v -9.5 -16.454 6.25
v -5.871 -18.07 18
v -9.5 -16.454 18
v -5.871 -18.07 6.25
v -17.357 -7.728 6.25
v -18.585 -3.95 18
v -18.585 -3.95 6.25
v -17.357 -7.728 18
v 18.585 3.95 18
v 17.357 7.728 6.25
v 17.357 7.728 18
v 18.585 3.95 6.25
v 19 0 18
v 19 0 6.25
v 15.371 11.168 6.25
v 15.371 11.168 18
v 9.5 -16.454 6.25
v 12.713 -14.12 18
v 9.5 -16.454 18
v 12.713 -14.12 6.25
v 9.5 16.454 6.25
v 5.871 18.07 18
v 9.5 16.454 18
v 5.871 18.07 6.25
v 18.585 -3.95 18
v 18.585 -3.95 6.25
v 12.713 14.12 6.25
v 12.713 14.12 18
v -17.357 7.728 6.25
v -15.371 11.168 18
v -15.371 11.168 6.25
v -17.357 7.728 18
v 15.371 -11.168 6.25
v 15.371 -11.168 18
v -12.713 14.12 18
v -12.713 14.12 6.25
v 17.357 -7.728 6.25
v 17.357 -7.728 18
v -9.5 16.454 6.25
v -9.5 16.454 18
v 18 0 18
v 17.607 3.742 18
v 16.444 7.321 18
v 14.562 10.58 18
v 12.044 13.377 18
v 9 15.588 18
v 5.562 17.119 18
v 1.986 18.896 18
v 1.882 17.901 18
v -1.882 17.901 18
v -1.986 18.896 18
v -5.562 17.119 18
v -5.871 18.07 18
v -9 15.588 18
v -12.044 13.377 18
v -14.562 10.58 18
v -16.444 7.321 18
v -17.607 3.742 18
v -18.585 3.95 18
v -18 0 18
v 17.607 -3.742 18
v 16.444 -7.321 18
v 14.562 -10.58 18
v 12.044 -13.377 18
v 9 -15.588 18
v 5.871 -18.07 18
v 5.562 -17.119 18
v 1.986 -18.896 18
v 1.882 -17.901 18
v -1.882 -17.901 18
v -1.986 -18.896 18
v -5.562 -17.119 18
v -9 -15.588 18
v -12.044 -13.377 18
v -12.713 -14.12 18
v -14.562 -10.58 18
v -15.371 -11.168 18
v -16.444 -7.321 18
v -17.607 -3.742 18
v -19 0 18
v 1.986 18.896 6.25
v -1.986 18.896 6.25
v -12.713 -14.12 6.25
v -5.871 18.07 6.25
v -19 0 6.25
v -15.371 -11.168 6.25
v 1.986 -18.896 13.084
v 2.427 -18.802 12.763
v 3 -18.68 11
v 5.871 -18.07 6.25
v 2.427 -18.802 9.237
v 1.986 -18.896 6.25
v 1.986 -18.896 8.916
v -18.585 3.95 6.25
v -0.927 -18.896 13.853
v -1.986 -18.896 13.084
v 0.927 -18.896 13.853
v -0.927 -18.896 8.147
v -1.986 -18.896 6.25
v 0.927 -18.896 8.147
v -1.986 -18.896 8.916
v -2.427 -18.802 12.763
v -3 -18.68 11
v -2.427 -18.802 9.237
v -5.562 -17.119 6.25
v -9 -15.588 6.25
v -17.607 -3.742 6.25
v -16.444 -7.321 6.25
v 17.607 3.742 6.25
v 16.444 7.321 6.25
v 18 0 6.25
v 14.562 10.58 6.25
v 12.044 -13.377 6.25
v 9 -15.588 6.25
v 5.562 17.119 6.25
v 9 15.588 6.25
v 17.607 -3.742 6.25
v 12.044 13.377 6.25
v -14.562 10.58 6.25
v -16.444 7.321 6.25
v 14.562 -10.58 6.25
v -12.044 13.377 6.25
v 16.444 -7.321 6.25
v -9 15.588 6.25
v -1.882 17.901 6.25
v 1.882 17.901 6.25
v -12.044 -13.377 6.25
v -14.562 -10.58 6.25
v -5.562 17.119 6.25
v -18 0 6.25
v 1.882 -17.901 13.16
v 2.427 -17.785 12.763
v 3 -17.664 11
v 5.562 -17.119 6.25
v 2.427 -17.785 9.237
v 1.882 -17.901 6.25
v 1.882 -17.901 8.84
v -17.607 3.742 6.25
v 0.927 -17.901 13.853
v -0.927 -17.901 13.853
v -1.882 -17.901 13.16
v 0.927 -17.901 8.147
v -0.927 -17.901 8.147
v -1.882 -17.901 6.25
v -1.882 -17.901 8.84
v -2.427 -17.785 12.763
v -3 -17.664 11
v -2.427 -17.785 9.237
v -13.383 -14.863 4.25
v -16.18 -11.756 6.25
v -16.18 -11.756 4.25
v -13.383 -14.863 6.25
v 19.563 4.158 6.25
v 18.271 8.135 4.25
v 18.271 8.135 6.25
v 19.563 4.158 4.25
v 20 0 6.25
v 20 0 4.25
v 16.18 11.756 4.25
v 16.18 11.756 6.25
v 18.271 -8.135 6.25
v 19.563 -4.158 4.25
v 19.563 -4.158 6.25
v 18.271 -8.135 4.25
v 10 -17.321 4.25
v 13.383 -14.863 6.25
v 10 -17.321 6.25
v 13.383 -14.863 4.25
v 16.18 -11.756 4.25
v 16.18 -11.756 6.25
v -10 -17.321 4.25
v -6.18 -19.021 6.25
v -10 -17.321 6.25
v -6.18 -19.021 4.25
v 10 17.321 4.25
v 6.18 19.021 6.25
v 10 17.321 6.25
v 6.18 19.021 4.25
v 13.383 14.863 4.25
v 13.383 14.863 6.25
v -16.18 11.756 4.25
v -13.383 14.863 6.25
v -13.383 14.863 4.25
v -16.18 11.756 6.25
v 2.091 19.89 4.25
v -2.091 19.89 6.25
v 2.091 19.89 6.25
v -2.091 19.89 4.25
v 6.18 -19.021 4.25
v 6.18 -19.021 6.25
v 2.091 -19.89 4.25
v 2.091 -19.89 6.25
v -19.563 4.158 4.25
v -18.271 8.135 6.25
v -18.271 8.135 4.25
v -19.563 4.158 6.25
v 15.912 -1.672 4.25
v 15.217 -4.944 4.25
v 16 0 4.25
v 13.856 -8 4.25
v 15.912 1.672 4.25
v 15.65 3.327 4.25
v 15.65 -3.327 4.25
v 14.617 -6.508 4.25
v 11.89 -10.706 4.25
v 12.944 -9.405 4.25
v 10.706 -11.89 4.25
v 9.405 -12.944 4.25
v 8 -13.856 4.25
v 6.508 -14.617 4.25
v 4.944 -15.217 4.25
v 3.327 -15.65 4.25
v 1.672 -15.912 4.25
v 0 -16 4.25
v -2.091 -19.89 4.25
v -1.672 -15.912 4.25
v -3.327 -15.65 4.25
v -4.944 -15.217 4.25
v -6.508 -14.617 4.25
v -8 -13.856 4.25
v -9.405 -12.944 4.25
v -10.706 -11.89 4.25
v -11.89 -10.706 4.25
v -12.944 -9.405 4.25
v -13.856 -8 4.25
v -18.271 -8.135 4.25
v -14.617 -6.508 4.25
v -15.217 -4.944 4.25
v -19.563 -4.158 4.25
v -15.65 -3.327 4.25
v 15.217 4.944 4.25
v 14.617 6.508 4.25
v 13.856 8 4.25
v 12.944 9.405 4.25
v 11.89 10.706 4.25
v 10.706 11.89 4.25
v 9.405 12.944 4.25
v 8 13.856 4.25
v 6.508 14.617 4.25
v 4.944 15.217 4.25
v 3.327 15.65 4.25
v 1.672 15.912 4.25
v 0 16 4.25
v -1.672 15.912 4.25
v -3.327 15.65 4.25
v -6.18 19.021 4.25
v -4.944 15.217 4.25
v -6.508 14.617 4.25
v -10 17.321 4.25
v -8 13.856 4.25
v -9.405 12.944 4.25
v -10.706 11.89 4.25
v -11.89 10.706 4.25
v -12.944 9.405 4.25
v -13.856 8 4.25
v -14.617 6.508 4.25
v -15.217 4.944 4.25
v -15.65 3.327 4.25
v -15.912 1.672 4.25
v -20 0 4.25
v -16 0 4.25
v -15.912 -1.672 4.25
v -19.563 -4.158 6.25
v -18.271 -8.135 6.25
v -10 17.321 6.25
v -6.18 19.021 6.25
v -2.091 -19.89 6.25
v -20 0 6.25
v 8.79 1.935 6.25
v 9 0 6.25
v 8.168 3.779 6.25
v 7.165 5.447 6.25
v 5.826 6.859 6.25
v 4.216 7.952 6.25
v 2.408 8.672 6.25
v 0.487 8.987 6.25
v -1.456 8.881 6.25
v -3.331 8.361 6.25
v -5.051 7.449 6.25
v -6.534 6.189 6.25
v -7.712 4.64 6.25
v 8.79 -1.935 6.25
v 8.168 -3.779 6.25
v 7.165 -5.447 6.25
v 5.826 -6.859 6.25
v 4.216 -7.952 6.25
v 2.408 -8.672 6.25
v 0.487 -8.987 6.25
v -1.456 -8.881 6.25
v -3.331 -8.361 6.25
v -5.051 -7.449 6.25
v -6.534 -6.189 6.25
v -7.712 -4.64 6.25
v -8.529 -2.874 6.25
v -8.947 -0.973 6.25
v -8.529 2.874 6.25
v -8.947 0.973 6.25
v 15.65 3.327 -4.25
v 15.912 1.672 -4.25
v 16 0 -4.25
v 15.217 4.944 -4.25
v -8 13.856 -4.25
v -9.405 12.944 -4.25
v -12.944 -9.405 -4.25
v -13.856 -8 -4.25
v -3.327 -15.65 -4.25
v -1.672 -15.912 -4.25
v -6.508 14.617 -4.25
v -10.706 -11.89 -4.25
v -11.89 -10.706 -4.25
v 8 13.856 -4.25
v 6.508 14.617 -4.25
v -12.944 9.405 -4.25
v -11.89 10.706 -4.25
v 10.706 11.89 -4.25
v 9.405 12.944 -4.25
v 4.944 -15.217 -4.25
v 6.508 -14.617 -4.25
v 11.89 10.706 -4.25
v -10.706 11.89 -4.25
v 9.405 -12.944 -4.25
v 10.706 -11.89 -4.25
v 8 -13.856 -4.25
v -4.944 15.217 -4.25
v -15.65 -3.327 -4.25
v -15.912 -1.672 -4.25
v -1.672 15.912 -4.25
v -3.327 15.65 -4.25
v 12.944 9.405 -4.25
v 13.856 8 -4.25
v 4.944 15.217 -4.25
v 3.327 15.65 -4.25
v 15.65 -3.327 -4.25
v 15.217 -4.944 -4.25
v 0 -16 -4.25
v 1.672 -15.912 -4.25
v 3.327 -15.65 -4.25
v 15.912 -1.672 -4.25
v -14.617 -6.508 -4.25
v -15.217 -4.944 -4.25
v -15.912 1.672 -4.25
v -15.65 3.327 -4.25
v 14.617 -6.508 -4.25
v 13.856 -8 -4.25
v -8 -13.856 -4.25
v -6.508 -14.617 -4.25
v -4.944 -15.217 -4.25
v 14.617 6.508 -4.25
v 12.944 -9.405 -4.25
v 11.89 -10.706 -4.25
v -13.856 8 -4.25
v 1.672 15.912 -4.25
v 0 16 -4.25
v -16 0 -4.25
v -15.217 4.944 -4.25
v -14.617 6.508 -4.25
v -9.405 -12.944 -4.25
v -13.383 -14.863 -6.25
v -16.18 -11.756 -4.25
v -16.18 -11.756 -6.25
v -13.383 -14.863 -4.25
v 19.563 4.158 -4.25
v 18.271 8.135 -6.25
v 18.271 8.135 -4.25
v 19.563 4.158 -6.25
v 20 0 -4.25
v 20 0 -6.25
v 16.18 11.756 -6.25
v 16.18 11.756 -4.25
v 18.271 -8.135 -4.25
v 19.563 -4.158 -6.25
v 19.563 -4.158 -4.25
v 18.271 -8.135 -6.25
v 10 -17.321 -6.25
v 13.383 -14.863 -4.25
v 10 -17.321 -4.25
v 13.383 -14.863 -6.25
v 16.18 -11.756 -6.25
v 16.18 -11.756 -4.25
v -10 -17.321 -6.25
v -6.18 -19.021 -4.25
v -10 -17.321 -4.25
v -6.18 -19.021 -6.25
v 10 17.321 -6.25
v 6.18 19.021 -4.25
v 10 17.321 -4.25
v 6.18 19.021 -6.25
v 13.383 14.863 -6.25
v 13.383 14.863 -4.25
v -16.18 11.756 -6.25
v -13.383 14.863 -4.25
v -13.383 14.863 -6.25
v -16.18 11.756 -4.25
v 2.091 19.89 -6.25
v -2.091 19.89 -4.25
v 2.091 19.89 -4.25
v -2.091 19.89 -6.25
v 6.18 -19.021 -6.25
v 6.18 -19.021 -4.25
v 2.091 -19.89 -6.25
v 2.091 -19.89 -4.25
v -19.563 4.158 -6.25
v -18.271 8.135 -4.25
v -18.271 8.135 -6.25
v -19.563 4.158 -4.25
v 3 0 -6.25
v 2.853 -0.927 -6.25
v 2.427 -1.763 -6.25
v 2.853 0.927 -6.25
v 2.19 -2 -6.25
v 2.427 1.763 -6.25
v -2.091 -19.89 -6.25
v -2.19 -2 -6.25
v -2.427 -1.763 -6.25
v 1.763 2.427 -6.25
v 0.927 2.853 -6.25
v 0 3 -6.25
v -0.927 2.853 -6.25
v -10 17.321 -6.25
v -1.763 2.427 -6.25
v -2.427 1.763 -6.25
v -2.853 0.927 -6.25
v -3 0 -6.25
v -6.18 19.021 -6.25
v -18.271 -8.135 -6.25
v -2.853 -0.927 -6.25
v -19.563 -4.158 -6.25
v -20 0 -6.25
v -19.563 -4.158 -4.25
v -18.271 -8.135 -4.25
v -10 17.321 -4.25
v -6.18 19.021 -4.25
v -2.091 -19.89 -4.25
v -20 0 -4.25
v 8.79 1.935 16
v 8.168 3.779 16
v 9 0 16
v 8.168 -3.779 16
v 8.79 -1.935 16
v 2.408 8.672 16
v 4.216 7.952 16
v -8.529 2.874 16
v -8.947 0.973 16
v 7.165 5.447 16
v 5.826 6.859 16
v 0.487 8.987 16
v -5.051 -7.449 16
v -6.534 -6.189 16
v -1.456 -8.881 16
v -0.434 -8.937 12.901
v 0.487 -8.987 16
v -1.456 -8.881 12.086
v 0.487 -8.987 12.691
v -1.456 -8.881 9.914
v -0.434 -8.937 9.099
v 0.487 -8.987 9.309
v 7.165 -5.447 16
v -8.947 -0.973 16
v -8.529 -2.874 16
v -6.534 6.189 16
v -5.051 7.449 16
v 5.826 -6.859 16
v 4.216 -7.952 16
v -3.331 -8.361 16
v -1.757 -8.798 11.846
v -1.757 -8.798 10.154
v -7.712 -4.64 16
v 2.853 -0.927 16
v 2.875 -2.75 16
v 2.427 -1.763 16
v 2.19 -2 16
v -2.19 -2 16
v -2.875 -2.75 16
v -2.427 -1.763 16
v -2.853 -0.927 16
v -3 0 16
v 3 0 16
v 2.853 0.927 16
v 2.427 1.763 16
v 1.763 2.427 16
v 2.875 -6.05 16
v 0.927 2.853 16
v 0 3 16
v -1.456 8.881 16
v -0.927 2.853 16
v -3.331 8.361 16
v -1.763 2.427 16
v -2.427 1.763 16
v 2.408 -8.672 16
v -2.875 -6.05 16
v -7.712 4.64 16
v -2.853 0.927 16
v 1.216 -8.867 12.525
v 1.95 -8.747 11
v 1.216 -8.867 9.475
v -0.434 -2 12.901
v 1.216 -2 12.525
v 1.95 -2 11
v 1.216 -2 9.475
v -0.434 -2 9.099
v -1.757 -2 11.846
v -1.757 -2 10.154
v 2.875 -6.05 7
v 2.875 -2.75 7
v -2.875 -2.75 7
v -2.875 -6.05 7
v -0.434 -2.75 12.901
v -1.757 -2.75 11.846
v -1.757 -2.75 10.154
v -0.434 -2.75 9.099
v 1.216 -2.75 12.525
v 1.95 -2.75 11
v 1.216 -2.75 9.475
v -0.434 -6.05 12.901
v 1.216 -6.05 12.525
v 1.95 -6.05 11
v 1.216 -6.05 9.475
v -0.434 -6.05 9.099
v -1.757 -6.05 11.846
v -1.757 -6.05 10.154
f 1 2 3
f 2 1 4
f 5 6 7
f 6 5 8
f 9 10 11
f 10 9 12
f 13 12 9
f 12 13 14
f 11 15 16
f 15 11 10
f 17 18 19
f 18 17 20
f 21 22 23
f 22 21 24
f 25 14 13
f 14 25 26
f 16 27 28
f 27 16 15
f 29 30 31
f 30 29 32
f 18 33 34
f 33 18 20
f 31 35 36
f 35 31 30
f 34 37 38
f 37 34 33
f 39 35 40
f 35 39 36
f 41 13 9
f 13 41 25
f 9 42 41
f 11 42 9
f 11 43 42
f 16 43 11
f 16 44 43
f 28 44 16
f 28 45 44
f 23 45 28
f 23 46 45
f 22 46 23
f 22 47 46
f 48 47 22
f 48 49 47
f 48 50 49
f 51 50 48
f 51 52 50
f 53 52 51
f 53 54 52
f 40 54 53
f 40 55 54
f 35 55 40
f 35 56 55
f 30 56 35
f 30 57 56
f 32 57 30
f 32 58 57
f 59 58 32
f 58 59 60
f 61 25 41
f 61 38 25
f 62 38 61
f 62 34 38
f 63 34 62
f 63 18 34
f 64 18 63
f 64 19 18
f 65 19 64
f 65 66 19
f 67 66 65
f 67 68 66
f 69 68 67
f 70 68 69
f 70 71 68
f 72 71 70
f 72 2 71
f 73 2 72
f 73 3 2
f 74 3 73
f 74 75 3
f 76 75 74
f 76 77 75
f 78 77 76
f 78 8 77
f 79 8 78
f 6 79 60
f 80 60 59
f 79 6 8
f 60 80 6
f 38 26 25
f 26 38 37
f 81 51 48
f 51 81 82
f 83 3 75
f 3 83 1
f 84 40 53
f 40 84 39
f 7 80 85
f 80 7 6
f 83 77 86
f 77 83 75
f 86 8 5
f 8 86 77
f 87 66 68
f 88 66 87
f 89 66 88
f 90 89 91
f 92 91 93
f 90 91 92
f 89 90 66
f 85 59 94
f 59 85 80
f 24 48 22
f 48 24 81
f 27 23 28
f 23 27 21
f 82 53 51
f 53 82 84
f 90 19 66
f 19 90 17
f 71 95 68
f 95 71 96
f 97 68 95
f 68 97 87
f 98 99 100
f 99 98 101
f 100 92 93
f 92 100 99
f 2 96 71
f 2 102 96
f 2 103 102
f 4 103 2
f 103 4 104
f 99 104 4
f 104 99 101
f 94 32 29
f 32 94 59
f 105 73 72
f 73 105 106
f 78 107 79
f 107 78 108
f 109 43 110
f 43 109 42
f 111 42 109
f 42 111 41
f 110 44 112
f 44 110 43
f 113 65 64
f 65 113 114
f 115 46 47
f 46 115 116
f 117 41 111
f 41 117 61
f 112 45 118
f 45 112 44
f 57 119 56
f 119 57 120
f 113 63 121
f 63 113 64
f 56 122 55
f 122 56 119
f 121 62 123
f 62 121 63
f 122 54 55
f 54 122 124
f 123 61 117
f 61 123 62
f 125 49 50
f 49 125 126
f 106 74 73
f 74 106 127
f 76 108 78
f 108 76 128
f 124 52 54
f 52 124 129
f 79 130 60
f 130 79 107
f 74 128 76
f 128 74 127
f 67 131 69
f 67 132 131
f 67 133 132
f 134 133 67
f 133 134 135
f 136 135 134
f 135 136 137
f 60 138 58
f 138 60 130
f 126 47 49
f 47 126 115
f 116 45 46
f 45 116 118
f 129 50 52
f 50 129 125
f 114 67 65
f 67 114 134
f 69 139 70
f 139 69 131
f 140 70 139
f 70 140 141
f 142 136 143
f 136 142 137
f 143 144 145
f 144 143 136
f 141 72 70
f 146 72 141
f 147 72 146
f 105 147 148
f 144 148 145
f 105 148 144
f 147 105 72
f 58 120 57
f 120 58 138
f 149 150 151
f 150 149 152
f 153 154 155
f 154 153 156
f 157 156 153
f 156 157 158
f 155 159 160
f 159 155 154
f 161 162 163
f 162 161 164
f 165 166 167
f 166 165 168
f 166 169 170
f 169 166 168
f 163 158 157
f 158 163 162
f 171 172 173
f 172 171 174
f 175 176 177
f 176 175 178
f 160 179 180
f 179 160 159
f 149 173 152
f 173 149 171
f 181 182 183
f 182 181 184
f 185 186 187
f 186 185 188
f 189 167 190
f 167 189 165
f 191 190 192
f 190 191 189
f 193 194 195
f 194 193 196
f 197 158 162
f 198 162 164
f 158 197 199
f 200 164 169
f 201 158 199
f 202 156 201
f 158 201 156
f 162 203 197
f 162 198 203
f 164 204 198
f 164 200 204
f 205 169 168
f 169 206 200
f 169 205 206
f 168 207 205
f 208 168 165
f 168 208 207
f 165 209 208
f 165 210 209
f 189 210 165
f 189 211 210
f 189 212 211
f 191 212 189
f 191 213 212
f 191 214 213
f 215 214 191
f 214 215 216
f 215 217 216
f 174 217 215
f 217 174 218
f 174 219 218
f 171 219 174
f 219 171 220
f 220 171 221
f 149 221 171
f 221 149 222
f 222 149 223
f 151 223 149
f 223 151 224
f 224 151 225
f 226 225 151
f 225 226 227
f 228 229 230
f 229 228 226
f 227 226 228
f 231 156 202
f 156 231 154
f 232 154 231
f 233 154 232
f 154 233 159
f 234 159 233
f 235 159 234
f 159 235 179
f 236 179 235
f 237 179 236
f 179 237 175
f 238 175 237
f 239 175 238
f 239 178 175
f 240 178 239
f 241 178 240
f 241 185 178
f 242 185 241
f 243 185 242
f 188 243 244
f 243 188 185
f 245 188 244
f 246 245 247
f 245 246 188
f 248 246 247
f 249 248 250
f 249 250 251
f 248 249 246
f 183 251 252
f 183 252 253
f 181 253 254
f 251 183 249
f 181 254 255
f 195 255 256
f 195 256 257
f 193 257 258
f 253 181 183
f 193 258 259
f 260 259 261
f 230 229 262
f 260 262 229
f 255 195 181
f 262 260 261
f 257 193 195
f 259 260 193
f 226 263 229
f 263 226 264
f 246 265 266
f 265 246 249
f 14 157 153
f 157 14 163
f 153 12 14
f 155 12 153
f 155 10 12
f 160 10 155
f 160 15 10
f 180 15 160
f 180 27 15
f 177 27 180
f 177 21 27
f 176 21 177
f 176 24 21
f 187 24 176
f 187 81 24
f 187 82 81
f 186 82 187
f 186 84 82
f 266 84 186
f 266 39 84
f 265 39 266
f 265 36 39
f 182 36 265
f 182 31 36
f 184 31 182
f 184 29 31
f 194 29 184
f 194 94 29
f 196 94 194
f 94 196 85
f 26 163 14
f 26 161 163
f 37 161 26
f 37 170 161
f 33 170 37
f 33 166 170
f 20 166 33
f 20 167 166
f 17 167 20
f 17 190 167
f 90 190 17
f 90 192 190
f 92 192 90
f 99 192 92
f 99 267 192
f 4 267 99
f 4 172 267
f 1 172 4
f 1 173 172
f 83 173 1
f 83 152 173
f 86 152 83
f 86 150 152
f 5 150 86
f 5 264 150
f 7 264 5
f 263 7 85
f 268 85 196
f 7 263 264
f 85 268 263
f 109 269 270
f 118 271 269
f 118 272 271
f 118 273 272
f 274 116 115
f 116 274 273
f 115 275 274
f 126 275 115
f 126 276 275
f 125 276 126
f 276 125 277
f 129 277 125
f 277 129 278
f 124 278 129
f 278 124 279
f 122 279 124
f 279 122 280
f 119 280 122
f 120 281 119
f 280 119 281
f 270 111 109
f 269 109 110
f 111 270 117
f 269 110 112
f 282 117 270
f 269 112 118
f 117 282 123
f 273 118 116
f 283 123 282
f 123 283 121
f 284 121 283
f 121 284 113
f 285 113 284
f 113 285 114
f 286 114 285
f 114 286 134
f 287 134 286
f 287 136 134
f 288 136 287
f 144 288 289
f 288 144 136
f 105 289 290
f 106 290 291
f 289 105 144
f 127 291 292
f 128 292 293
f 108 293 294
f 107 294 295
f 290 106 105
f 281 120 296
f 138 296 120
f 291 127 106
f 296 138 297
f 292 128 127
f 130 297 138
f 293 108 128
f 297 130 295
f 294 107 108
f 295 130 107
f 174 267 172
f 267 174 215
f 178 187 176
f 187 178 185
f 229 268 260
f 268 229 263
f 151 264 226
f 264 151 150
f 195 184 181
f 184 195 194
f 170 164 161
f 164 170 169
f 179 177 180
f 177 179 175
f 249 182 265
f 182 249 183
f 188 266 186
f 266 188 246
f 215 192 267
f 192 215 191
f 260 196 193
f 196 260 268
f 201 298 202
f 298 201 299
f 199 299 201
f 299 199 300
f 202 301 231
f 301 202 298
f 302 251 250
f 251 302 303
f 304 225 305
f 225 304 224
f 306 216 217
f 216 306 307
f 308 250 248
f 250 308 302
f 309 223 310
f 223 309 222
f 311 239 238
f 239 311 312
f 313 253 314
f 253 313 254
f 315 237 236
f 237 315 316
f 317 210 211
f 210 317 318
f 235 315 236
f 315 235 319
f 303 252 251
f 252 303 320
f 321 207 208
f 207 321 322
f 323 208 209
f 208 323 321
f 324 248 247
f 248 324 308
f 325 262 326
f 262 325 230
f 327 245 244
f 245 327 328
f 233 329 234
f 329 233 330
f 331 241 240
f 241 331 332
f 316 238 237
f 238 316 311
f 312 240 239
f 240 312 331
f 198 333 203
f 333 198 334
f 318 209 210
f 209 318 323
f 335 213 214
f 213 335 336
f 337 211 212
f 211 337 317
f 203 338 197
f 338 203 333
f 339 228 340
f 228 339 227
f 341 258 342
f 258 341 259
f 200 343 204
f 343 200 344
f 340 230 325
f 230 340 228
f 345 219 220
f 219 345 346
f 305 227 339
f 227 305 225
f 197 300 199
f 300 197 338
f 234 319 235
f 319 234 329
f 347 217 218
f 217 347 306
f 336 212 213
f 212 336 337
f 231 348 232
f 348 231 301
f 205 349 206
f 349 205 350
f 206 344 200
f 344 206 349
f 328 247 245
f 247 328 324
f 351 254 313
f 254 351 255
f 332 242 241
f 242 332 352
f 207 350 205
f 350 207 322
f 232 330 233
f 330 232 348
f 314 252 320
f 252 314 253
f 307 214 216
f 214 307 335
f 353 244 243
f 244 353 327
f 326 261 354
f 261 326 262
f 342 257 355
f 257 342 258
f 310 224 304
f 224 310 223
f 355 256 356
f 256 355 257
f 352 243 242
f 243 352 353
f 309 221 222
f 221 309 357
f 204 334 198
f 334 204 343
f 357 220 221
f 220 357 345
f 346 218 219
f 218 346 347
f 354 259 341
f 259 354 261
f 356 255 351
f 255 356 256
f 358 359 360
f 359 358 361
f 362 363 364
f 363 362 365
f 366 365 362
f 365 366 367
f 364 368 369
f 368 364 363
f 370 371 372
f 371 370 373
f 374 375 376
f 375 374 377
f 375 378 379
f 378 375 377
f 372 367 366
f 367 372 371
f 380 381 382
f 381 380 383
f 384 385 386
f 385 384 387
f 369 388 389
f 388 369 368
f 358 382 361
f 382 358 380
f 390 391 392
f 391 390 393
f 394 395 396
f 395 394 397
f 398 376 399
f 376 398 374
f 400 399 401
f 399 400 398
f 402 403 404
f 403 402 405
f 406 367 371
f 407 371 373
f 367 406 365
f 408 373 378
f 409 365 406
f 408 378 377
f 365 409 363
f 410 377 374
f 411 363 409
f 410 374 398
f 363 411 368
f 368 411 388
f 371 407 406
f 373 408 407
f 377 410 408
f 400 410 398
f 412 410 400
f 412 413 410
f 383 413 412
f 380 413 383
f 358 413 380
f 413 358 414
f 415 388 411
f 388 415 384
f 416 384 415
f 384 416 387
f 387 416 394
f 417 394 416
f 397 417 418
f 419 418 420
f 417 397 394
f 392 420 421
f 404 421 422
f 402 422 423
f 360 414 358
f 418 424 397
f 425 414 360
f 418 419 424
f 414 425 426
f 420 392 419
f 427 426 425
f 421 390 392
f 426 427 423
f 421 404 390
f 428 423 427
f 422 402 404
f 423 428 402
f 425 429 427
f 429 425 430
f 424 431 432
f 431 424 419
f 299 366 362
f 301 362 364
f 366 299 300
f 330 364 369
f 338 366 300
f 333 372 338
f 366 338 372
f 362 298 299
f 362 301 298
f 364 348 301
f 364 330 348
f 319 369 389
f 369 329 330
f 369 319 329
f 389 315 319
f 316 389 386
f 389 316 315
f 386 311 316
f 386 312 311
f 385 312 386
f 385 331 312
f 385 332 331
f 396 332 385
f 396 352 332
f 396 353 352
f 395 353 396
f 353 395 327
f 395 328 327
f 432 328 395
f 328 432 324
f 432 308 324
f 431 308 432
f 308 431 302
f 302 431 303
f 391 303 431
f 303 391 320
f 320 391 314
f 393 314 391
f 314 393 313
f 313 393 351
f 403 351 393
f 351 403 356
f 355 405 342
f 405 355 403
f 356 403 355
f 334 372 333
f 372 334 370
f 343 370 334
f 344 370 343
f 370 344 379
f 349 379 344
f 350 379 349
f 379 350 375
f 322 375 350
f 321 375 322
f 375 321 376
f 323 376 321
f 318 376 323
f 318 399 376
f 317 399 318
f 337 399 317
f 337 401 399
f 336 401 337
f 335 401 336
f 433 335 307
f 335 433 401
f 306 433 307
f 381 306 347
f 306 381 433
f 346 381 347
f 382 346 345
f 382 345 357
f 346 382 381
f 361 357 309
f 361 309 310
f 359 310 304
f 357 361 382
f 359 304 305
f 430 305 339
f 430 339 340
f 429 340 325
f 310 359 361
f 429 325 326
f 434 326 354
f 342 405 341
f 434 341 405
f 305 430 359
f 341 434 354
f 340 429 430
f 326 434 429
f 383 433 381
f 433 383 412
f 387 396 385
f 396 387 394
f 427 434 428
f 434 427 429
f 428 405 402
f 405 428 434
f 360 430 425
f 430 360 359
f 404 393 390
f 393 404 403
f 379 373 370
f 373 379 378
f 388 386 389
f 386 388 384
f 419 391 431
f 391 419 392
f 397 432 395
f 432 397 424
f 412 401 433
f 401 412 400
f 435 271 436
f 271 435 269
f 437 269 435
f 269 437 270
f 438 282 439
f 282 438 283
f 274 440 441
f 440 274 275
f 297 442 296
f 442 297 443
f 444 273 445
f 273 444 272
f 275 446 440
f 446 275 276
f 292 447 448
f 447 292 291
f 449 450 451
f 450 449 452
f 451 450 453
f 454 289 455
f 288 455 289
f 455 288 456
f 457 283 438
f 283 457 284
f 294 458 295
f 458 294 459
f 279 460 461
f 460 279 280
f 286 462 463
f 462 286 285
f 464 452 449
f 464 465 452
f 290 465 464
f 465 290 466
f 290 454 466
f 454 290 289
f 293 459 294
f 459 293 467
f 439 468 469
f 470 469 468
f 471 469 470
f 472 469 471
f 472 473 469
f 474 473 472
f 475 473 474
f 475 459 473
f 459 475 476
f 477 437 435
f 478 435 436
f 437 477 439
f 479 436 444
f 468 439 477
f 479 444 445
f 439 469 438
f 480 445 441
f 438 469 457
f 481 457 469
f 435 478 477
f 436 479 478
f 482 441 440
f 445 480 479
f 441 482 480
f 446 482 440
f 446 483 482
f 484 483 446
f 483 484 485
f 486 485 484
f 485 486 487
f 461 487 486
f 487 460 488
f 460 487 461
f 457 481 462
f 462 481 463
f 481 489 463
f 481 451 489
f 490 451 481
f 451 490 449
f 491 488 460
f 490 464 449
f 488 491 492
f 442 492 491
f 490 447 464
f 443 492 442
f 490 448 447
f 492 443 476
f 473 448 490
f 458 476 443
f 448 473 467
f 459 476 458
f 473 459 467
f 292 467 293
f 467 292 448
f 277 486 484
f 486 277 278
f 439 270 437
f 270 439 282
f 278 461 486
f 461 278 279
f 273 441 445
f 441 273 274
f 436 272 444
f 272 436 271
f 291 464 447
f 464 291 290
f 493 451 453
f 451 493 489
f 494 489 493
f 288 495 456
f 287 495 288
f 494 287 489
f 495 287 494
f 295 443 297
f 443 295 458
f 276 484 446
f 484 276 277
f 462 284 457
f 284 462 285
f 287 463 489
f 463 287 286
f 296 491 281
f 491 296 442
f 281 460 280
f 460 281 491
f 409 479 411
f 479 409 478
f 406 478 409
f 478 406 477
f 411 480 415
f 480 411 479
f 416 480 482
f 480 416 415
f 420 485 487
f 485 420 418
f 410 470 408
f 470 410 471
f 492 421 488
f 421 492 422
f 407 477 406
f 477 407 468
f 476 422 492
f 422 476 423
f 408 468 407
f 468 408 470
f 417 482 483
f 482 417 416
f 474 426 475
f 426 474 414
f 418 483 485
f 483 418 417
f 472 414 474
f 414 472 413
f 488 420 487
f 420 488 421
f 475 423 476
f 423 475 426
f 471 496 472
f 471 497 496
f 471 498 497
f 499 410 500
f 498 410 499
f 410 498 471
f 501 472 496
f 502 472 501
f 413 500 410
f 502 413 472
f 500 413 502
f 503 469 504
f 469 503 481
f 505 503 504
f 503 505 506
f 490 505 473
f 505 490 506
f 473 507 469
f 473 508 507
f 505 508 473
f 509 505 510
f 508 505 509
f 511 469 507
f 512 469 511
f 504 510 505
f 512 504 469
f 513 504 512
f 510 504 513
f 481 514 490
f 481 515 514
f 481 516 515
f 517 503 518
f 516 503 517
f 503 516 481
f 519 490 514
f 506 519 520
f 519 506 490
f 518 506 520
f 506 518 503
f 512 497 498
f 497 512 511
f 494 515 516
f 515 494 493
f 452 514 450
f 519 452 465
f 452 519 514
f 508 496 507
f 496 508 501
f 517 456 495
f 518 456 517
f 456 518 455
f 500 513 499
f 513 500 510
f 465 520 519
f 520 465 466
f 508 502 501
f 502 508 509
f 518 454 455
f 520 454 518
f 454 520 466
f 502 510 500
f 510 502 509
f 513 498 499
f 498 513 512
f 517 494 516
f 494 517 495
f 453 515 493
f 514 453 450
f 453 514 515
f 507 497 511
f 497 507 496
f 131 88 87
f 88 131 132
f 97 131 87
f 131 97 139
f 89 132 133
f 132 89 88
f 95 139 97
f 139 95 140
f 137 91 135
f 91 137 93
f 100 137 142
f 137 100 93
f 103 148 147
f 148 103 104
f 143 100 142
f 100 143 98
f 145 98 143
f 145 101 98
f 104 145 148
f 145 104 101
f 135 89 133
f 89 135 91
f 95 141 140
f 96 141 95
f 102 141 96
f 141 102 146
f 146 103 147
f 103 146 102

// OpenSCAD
// file: ../parts/nema17.scad
/*
 * Written by Dermot Tynan, Kalopa Research.
 * GPLv2.
 *
 * All dimensions are in mm.
 */
module elongated_cylinder(er, eh, s)
{
	if (s > 0) {
		union() {
			translate([-s, 0, 0]) cylinder(r = er, h = eh, center = true);
			translate([s, 0, 0]) cylinder(r = er, h = eh, center = true);
			cube([s * 2, er * 2, eh], center = true);
		}
	} else {
		cylinder(r = er, h = eh, center = true);
	}
}

module nema17_shaft()
{
	difference() {
		cylinder(r = 6/2, h = 50, center = true, $fn = 20);
		translate([0, -4.5, 0]) cube([5, 5, 55], center = true);
	}
}

module nema17_motor(s)
{
	union() {
		translate([0, 0, 11]) nema17_shaft();
		elongated_cylinder(11.8, 10, s);
		translate([-15.51, -15.51, 0]) elongated_cylinder(2, 10, s);
		translate([-15.51, 15.51, 0]) elongated_cylinder(2, 10, s);
		translate([15.51, -15.51, 0]) elongated_cylinder(2, 10, s);
		translate([15.51, 15.51, 0]) elongated_cylinder(2, 10, s);
		translate([0, 0, -27]) cube(42 + 2*s, 42, 47, center = true);
	}
}

nema17_motor(4);
// main file
/*
 * Spindle is 40mm outer edge, and has a 10.5mm slot for three
 * windings of the sheet.
 *
 * Inner diameter is 32mm.  Edge is 2mm.  Mounted on an 8mm shaft
 * thing, with a waterproof collar.
 */

use <../parts/nema17.scad>

module winch()
{
	union() {
		/*
		 * Top winch plates
		 */
		translate([0, 0, 10.5/2]) cylinder(r = 40/2, h = 2, center = true);
		cylinder(r = 32/2, h = 10.5, center = true, $fn = 60);
		translate([0, 0, -10.5/2]) cylinder(r = 40/2, h = 2, center = true);
		/*
		 * Outer skirt
		 */
		difference() {
			translate([0, 0, 12]) cylinder(r = 38/2, h = 12, center = true);
			translate([0, 0, 12]) cylinder(r = 36/2, h = 13, center = true);
		}
	}
}

module winch_gear()
{
	difference() {
		union() {
			winch();
			/*
			 * Shaft collar
			 */
			translate([0, 0, 11]) cylinder(r = 9, h = 10, center = true);
		}
		nema17_shaft();
		translate([0, -4.4, 12]) cube([5.75, 3.3, 10], center = true);
		translate([0, -12, 11]) rotate(a = [90, 0, 0]) cylinder(r = 3.9/2, h = 22, center = true);
		translate([0, -15, 11]) rotate(a = [90, 0, 0]) cylinder(r = 6/2, h = 12, center = true);
	}
}

winch_gear();
